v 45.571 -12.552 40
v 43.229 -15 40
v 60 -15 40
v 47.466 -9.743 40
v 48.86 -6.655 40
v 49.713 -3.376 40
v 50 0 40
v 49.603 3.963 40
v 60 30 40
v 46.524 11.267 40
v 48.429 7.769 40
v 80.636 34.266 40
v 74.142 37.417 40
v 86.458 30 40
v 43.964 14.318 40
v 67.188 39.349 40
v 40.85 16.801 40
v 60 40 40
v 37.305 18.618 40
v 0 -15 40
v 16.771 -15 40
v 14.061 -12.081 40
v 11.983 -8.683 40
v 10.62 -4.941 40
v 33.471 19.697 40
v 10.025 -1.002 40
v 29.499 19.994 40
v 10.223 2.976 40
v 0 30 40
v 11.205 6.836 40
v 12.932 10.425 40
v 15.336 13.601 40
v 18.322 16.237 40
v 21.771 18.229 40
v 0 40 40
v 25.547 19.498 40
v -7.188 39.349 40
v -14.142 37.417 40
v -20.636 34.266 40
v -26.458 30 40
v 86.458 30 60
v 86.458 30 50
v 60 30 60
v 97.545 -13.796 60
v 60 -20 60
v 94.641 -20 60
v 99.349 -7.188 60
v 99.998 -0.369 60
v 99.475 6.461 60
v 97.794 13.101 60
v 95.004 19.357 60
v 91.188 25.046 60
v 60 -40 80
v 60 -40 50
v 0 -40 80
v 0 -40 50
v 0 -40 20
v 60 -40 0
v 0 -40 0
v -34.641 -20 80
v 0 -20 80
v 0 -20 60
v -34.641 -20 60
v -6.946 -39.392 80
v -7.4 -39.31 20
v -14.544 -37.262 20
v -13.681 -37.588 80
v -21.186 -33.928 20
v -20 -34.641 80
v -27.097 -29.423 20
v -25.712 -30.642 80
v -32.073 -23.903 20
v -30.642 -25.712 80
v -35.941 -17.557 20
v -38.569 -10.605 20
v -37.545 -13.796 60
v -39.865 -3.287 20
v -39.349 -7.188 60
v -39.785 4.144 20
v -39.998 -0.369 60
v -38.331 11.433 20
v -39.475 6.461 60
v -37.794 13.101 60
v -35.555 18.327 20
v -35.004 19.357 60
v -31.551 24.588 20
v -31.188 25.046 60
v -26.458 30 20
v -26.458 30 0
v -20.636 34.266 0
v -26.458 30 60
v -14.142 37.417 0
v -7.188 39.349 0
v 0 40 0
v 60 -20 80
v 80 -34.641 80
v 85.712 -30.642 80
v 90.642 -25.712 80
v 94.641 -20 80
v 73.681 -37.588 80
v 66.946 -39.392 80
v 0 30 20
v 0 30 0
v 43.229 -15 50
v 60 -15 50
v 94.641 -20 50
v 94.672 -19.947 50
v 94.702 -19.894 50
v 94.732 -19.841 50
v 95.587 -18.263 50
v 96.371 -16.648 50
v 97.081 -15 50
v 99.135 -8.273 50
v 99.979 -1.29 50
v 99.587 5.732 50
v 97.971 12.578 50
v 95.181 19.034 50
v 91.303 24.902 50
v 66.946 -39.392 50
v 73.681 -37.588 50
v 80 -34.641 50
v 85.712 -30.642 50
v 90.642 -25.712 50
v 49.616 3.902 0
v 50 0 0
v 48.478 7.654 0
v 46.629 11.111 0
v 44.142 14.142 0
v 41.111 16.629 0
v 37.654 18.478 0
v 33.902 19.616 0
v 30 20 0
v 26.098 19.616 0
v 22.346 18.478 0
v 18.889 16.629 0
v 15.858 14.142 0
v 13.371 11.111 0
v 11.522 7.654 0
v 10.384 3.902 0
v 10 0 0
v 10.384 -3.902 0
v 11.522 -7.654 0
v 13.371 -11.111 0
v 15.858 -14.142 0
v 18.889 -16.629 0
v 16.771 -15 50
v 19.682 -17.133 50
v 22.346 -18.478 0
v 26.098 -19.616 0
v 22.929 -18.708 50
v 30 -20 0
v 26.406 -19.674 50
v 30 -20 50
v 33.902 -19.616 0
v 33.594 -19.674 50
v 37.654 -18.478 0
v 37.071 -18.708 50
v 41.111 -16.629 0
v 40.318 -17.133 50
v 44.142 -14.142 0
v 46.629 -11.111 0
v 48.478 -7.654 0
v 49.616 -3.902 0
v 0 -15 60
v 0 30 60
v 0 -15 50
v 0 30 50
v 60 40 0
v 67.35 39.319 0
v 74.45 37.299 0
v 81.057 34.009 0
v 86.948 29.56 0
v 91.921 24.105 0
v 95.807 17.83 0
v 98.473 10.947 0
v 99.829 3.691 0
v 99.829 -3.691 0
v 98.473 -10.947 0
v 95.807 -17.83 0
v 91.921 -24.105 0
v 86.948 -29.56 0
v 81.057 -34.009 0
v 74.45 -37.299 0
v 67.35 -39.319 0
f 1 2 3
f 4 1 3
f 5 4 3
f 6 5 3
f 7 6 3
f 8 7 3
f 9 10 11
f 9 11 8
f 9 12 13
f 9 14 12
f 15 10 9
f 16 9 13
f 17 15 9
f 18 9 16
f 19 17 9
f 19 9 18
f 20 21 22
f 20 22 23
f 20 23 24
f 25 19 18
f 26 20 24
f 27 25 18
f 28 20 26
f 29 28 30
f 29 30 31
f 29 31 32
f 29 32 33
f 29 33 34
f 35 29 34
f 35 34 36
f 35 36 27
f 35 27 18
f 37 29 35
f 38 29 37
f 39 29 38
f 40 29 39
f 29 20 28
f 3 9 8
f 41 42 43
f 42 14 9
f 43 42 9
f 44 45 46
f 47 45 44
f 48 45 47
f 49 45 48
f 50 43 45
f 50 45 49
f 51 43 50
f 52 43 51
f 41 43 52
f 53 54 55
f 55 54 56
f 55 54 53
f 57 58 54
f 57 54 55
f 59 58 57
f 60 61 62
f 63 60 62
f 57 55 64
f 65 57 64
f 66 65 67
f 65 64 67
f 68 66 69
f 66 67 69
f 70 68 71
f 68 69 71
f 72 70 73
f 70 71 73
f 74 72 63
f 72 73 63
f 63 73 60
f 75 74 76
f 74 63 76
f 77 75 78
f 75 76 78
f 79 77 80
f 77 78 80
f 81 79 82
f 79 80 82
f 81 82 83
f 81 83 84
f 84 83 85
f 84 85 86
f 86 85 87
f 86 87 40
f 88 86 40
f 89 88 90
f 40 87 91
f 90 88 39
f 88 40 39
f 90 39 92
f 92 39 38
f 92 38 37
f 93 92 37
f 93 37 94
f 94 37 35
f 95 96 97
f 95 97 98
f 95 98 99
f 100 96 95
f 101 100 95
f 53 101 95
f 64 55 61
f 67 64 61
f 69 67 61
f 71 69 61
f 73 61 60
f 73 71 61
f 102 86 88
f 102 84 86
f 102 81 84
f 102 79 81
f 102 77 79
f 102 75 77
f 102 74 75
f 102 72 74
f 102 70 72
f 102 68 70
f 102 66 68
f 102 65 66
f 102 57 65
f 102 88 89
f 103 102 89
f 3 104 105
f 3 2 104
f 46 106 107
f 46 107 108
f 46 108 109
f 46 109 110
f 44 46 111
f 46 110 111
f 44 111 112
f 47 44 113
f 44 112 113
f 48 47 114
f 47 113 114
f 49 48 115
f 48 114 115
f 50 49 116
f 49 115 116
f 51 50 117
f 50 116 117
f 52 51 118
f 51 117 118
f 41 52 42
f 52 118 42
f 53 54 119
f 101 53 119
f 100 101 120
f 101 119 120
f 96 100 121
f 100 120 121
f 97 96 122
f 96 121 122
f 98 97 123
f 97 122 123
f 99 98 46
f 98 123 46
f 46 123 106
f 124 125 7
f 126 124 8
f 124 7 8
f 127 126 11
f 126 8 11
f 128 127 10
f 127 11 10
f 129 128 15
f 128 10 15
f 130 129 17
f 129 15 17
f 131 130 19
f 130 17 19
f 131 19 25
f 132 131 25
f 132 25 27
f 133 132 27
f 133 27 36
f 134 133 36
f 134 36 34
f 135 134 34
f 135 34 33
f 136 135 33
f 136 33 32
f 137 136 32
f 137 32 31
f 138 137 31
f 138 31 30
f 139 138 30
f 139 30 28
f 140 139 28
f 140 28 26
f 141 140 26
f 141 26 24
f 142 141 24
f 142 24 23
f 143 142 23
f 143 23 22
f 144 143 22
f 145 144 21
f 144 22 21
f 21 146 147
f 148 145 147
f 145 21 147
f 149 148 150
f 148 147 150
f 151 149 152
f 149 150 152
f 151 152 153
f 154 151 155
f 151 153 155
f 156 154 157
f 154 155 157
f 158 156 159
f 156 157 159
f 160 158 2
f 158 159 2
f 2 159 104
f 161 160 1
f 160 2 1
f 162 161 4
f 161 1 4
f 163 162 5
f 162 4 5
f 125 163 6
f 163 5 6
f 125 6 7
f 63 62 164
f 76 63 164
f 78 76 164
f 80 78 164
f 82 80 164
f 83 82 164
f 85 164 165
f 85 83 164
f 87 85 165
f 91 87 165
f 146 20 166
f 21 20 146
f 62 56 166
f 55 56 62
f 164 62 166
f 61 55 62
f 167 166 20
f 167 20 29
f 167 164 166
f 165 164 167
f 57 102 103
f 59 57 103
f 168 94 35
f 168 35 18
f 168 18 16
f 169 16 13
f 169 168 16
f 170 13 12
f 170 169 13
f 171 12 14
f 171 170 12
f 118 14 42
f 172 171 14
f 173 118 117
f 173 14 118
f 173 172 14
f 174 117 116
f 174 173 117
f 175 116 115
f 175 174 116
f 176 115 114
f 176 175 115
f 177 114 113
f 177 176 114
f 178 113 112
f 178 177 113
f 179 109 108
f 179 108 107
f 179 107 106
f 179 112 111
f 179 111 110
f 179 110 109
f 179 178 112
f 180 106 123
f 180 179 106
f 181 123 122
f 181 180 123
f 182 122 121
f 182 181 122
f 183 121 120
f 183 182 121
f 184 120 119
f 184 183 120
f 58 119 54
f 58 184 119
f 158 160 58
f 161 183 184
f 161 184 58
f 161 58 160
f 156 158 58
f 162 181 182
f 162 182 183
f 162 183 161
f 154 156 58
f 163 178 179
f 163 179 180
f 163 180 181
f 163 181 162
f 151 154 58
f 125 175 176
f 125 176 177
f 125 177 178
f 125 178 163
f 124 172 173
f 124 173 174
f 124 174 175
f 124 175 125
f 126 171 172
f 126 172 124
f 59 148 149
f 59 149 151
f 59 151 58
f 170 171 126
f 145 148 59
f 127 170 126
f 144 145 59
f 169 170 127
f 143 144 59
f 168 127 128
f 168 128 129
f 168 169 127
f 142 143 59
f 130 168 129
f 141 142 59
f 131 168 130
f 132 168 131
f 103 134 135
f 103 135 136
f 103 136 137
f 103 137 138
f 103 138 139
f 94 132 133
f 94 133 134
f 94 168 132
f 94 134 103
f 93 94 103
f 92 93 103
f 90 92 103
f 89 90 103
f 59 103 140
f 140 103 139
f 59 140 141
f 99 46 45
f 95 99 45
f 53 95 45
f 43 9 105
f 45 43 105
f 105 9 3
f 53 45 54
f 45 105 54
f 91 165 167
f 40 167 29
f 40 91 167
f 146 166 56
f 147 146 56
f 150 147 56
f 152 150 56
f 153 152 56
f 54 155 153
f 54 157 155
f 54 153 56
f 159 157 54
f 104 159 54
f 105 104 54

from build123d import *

# Parameters (mm, degrees)
BOSS_EXTRUDE1_DEPTH     = 80
SKETCH2_R               = 20
CUT_EXTRUDE1_DEPTH      = 80
CUT_EXTRUDE3_DEPTH      = 170
CUT_EXTRUDE3_DEPTH_BACK = 60
SKETCH4_W               = 20
SKETCH4_H               = 60
CUT_EXTRUDE4_DEPTH      = 170
CUT_EXTRUDE4_DEPTH_BACK = 170
SKETCH5_W               = 20
SKETCH5_H               = 10
SKETCH6_W               = 60
SKETCH6_H               = 25
CUT_EXTRUDE5_DEPTH      = 30
SKETCH7_W               = 60
SKETCH7_H               = 10
CUT_EXTRUDE6_DEPTH      = 62
SKETCH8_W               = 60
SKETCH8_H               = 25
BOSS_EXTRUDE2_DEPTH     = 30
CUT_EXTRUDE7_START      = -30
CUT_EXTRUDE7_DEPTH      = 30
CUT_EXTRUDE8_START      = -30
CUT_EXTRUDE8_DEPTH      = 30
CUT_EXTRUDE9_DEPTH      = 10
BOSS_EXTRUDE3_DEPTH     = 10
BOSS_EXTRUDE4_DEPTH     = 20
SKETCH18_W              = 37.195082215
SKETCH18_H              = 5
CUT_EXTRUDE23_DEPTH     = 20
CUT_EXTRUDE25_DEPTH     = 30
SKETCH21_W              = 30
SKETCH21_H              = 25.000260328
CUT_EXTRUDE31_DEPTH     = 30
CUT_EXTRUDE32_DEPTH     = 30
SKETCH26_W              = 10
SKETCH26_H              = 5.000052065
CUT_EXTRUDE33_DEPTH     = 57
SKETCH29_W              = 34.732287975
SKETCH29_H              = 30
CUT_EXTRUDE37_DEPTH     = 57
SKETCH30_W              = 34.732287975
SKETCH30_H              = 10
CUT_EXTRUDE38_DEPTH     = 57
SKETCH31_W              = 10
SKETCH31_H              = 0.158503964
CUT_EXTRUDE39_DEPTH     = 57
SKETCH32_W              = 0.091268964
SKETCH32_H              = 10
CUT_EXTRUDE40_DEPTH     = 57
BOSS_EXTRUDE6_DEPTH     = 30
BOSS_EXTRUDE7_DEPTH     = 10
SKETCH37_W              = 20
SKETCH37_H              = 70
CUT_EXTRUDE47_DEPTH     = 68
SKETCH45_W              = 60
SKETCH45_H              = 30
BOSS_EXTRUDE10_DEPTH    = 0.0001
BOSS_EXTRUDE11_START    = 20
BOSS_EXTRUDE11_DEPTH    = 20
SKETCH49_W              = 20
SKETCH49_H              = 70
CUT_EXTRUDE54_DEPTH     = 95


with BuildPart() as part:
    # Sketch1 → Boss-Extrude1 (new body)
    with BuildSketch(Plane.XY):
        with BuildLine():
            Line((0, 40), (60, 40))
            ThreePointArc((60, 40), (100, 0), (60, -40))
            Line((60, -40), (0, -40))
            ThreePointArc((0, -40), (-40, 0), (0, 40))
        make_face()
    extrude(amount=BOSS_EXTRUDE1_DEPTH)

    # Sketch2 → Cut-Extrude1 (cut)
    with BuildSketch(Plane.XY.offset(80)):
        with Locations((30, 0)):
            Circle(SKETCH2_R)
    extrude(amount=-CUT_EXTRUDE1_DEPTH, mode=Mode.SUBTRACT)

    # Sketch4 → Cut-Extrude3 (cut, two sides: drawn at the far end of the back side and taken through both)
    with BuildSketch(Plane(origin=(0, 0, 0), x_dir=(0, 0, -1), z_dir=(1, 0, 0)).offset(-CUT_EXTRUDE3_DEPTH_BACK)):
        with Locations((-70, 10)):
            Rectangle(SKETCH4_W, SKETCH4_H)
    extrude(amount=CUT_EXTRUDE3_DEPTH + CUT_EXTRUDE3_DEPTH_BACK, mode=Mode.SUBTRACT)

    # Sketch5 → Cut-Extrude4 (cut, two sides: drawn at the far end of the back side and taken through both)
    with BuildSketch(Plane(origin=(0, 0, 0), x_dir=(0, 0, -1), z_dir=(1, 0, 0)).offset(-CUT_EXTRUDE4_DEPTH_BACK)):
        with Locations((-50, 35)):
            Rectangle(SKETCH5_W, SKETCH5_H)
    extrude(amount=CUT_EXTRUDE4_DEPTH + CUT_EXTRUDE4_DEPTH_BACK, mode=Mode.SUBTRACT)

    # Sketch6 → Cut-Extrude5 (cut)
    with BuildSketch(Plane.XY.offset(80)):
        with Locations((30, -27.5)):
            Rectangle(SKETCH6_W, SKETCH6_H)
    extrude(amount=-CUT_EXTRUDE5_DEPTH, mode=Mode.SUBTRACT)

    # Sketch7 → Cut-Extrude6 (cut)
    with BuildSketch(Plane.XZ.offset(15)):
        with Locations((30, 55)):
            Rectangle(SKETCH7_W, SKETCH7_H)
    extrude(amount=-CUT_EXTRUDE6_DEPTH, mode=Mode.SUBTRACT)

    # Sketch8 → Boss-Extrude2 (add)
    with BuildSketch(Plane.XY.offset(50)):
        with Locations((30, -27.5)):
            Rectangle(SKETCH8_W, SKETCH8_H)
    extrude(amount=BOSS_EXTRUDE2_DEPTH)

    # Sketch9 → Cut-Extrude7 (cut)
    with BuildSketch(Plane(origin=(0, 0, 50), x_dir=(-1, 0, 0), z_dir=(0, 0, -1)).offset(CUT_EXTRUDE7_START)):
        with BuildLine():
            Line((-43.228756555, -15), (-16.771243445, -15))
            ThreePointArc((-16.771243445, -15), (-30, -20), (-43.228756555, -15))
        make_face()
    extrude(amount=CUT_EXTRUDE7_DEPTH, mode=Mode.SUBTRACT)

    # Sketch10 → Cut-Extrude8 (cut)
    with BuildSketch(Plane.XY.offset(80).offset(CUT_EXTRUDE8_START)):
        with BuildLine():
            Line((60, -20), (60, -40))
            ThreePointArc((60, -40), (80, -34.641016151), (94.641016151, -20))
            Line((94.641016151, -20), (60, -20))
        make_face()
    extrude(amount=CUT_EXTRUDE8_DEPTH, mode=Mode.SUBTRACT)

    # Sketch11 → Cut-Extrude9 (cut)
    with BuildSketch(Plane.XY.offset(50)):
        with BuildLine():
            Line((60, 30), (0, 30))
            Line((0, 30), (0, -15))
            Line((0, -15), (16.771243445, -15))
            ThreePointArc((16.771243445, -15), (30, 20), (43.228756555, -15))
            Line((43.228756555, -15), (60, -15))
            Line((60, -15), (60, 30))
        make_face()
    extrude(amount=-CUT_EXTRUDE9_DEPTH, mode=Mode.SUBTRACT)

    # Sketch12 → Boss-Extrude3 (add)
    with BuildSketch(Plane.XY.offset(50)):
        with BuildLine():
            Line((60, -20), (94.641016151, -20))
            ThreePointArc((94.641016151, -20), (80, -34.641016151), (60, -40))
            Line((60, -40), (60, -20))
        make_face()
    extrude(amount=BOSS_EXTRUDE3_DEPTH)

    # Sketch17 → Boss-Extrude4 (add)
    with BuildSketch(Plane.XY.offset(60)):
        with BuildLine():
            Line((97.080992435, -15), (60, -15))
            Line((60, -15), (60, -40))
            ThreePointArc((60, -40), (82.360679775, -33.166247904), (97.080992435, -15))
        make_face()
    extrude(amount=BOSS_EXTRUDE4_DEPTH)

    # Sketch18 → Cut-Extrude23 (cut)
    with BuildSketch(Plane.XY.offset(80)):
        with Locations((78.483451328, -17.5)):
            Rectangle(SKETCH18_W, SKETCH18_H)
    extrude(amount=-CUT_EXTRUDE23_DEPTH, mode=Mode.SUBTRACT)

    # Sketch19 → Cut-Extrude25 (cut)
    with BuildSketch(Plane.XY.offset(80)):
        with BuildLine():
            Line((16.771243445, -15), (0, -15))
            Line((0, -15), (0, -20))
            Line((0, -20), (0, -40))
            Line((0, -40), (60, -40))
            Line((60, -40), (59.908728176, -20))
            Line((59.908728176, -20), (59.88591022, -20))
            Line((59.88591022, -20), (59.88591022, -15))
            Line((59.88591022, -15), (43.228756555, -15))
            ThreePointArc((43.228756555, -15), (30, -20), (16.771243445, -15))
        make_face()
    extrude(amount=-CUT_EXTRUDE25_DEPTH, mode=Mode.SUBTRACT)

    # Sketch21 → Cut-Extrude31 (cut)
    with BuildSketch(Plane(origin=(59.816210597, 0.272976733, 0), x_dir=(0, 0, 1), z_dir=(-0.999989586980257, -0.004563543694874004, 0))):
        with Locations((65, -27.773265937)):
            Rectangle(SKETCH21_W, SKETCH21_H)
    extrude(amount=CUT_EXTRUDE31_DEPTH, mode=Mode.SUBTRACT)

    # Sketch24 → Cut-Extrude32 (cut)
    with BuildSketch(Plane.XY.offset(50)):
        with BuildLine():
            Line((59.88591022, -15), (97.080992435, -15))
            ThreePointArc((97.080992435, -15), (98.92976522, 9.1909401), (86.456775103, 30.000650845))
            Line((86.456775103, 30.000650845), (59.88591022, 30.000650845))
            Line((59.88591022, 30.000650845), (59.88591022, -15))
        make_face()
    extrude(amount=CUT_EXTRUDE32_DEPTH, mode=Mode.SUBTRACT)

    # Sketch26 → Cut-Extrude33 (cut)
    with BuildSketch(Plane(origin=(59.816210597, 0.272976733, 0), x_dir=(0, 0, 1), z_dir=(-0.9999895869802571, -0.0045635436948740045, 0))):
        with Locations((55, -17.773161806)):
            Rectangle(SKETCH26_W, SKETCH26_H)
    extrude(amount=-CUT_EXTRUDE33_DEPTH, mode=Mode.SUBTRACT)

    # Sketch29 → Cut-Extrude37 (cut)
    with BuildSketch(Plane(origin=(0, -20, 0), x_dir=(1, 0, 0), z_dir=(0, 1, 0))):
        with Locations((77.274872164, -65)):
            Rectangle(SKETCH29_W, SKETCH29_H)
    extrude(amount=-CUT_EXTRUDE37_DEPTH, mode=Mode.SUBTRACT)

    # Sketch30 → Cut-Extrude38 (cut)
    with BuildSketch(Plane.XZ.offset(20)):
        with Locations((77.274872164, 55)):
            Rectangle(SKETCH30_W, SKETCH30_H)
    extrude(amount=-CUT_EXTRUDE38_DEPTH, mode=Mode.SUBTRACT)

    # Sketch31 → Cut-Extrude39 (cut)
    with BuildSketch(Plane.ZY.offset(-94.641016151)):
        with Locations((55, -19.920748018)):
            Rectangle(SKETCH31_W, SKETCH31_H)
    extrude(amount=-CUT_EXTRUDE39_DEPTH, mode=Mode.SUBTRACT)

    # Sketch32 → Cut-Extrude40 (cut)
    with BuildSketch(Plane(origin=(0.092517579, -20.272976733, 0), x_dir=(0.9999895869802571, 0.0045635436948740045, 0), z_dir=(-0.004563543694874004, 0.999989586980257, 0))):
        with Locations((94.5951176, -55)):
            Rectangle(SKETCH32_W, SKETCH32_H)
    extrude(amount=-CUT_EXTRUDE40_DEPTH, mode=Mode.SUBTRACT)

    # Sketch33 → Boss-Extrude6 (add)
    with BuildSketch(Plane.XY.offset(50)):
        with BuildLine():
            Line((60, -20), (60, -40))
            ThreePointArc((60, -40), (80, -34.641016151), (94.641016151, -20))
            Line((94.641016151, -20), (60, -20))
        make_face()
    extrude(amount=BOSS_EXTRUDE6_DEPTH)

    # Sketch34 → Boss-Extrude7 (add)
    with BuildSketch(Plane.XY.offset(50)):
        with BuildLine():
            Line((60, 30), (60, -20))
            Line((60, -20), (94.641016151, -20))
            ThreePointArc((94.641016151, -20), (99.474771304, 6.46083822), (86.457513111, 30))
            Line((86.457513111, 30), (60, 30))
        make_face()
    extrude(amount=BOSS_EXTRUDE7_DEPTH)

    # Sketch37 → Cut-Extrude47 (cut)
    with BuildSketch(Plane(origin=(0, 0, 0), x_dir=(0, 0, -1), z_dir=(1, 0, 0))):
        with Locations((-10, -5)):
            Rectangle(SKETCH37_W, SKETCH37_H)
    extrude(amount=-CUT_EXTRUDE47_DEPTH, mode=Mode.SUBTRACT)

    # Sketch45 → Boss-Extrude10 (add)
    with BuildSketch(Plane(origin=(0, -40, 0), x_dir=(-1, 0, 0), z_dir=(0, -1, 0))):
        with Locations((-30, -65)):
            Rectangle(SKETCH45_W, SKETCH45_H)
    extrude(amount=-BOSS_EXTRUDE10_DEPTH)

    # Sketch46 → Boss-Extrude11 (add)
    with BuildSketch(Plane(origin=(0, 0, 20), x_dir=(-1, 0, 0), z_dir=(0, 0, -1)).offset(BOSS_EXTRUDE11_START)):
        with BuildLine():
            Line((26.457513111, 30), (0, 30))
            Line((0, 30), (0, -40))
            ThreePointArc((0, -40), (37.416573868, -14.142135624), (26.457513111, 30))
        make_face()
    extrude(amount=-BOSS_EXTRUDE11_DEPTH)

    # Sketch49 → Cut-Extrude54 (cut)
    with BuildSketch(Plane(origin=(0, 0, 0), x_dir=(0, 0, -1), z_dir=(1, 0, 0))):
        with Locations((-10, -5)):
            Rectangle(SKETCH49_W, SKETCH49_H)
    extrude(amount=-CUT_EXTRUDE54_DEPTH, mode=Mode.SUBTRACT)


solid = part.part
